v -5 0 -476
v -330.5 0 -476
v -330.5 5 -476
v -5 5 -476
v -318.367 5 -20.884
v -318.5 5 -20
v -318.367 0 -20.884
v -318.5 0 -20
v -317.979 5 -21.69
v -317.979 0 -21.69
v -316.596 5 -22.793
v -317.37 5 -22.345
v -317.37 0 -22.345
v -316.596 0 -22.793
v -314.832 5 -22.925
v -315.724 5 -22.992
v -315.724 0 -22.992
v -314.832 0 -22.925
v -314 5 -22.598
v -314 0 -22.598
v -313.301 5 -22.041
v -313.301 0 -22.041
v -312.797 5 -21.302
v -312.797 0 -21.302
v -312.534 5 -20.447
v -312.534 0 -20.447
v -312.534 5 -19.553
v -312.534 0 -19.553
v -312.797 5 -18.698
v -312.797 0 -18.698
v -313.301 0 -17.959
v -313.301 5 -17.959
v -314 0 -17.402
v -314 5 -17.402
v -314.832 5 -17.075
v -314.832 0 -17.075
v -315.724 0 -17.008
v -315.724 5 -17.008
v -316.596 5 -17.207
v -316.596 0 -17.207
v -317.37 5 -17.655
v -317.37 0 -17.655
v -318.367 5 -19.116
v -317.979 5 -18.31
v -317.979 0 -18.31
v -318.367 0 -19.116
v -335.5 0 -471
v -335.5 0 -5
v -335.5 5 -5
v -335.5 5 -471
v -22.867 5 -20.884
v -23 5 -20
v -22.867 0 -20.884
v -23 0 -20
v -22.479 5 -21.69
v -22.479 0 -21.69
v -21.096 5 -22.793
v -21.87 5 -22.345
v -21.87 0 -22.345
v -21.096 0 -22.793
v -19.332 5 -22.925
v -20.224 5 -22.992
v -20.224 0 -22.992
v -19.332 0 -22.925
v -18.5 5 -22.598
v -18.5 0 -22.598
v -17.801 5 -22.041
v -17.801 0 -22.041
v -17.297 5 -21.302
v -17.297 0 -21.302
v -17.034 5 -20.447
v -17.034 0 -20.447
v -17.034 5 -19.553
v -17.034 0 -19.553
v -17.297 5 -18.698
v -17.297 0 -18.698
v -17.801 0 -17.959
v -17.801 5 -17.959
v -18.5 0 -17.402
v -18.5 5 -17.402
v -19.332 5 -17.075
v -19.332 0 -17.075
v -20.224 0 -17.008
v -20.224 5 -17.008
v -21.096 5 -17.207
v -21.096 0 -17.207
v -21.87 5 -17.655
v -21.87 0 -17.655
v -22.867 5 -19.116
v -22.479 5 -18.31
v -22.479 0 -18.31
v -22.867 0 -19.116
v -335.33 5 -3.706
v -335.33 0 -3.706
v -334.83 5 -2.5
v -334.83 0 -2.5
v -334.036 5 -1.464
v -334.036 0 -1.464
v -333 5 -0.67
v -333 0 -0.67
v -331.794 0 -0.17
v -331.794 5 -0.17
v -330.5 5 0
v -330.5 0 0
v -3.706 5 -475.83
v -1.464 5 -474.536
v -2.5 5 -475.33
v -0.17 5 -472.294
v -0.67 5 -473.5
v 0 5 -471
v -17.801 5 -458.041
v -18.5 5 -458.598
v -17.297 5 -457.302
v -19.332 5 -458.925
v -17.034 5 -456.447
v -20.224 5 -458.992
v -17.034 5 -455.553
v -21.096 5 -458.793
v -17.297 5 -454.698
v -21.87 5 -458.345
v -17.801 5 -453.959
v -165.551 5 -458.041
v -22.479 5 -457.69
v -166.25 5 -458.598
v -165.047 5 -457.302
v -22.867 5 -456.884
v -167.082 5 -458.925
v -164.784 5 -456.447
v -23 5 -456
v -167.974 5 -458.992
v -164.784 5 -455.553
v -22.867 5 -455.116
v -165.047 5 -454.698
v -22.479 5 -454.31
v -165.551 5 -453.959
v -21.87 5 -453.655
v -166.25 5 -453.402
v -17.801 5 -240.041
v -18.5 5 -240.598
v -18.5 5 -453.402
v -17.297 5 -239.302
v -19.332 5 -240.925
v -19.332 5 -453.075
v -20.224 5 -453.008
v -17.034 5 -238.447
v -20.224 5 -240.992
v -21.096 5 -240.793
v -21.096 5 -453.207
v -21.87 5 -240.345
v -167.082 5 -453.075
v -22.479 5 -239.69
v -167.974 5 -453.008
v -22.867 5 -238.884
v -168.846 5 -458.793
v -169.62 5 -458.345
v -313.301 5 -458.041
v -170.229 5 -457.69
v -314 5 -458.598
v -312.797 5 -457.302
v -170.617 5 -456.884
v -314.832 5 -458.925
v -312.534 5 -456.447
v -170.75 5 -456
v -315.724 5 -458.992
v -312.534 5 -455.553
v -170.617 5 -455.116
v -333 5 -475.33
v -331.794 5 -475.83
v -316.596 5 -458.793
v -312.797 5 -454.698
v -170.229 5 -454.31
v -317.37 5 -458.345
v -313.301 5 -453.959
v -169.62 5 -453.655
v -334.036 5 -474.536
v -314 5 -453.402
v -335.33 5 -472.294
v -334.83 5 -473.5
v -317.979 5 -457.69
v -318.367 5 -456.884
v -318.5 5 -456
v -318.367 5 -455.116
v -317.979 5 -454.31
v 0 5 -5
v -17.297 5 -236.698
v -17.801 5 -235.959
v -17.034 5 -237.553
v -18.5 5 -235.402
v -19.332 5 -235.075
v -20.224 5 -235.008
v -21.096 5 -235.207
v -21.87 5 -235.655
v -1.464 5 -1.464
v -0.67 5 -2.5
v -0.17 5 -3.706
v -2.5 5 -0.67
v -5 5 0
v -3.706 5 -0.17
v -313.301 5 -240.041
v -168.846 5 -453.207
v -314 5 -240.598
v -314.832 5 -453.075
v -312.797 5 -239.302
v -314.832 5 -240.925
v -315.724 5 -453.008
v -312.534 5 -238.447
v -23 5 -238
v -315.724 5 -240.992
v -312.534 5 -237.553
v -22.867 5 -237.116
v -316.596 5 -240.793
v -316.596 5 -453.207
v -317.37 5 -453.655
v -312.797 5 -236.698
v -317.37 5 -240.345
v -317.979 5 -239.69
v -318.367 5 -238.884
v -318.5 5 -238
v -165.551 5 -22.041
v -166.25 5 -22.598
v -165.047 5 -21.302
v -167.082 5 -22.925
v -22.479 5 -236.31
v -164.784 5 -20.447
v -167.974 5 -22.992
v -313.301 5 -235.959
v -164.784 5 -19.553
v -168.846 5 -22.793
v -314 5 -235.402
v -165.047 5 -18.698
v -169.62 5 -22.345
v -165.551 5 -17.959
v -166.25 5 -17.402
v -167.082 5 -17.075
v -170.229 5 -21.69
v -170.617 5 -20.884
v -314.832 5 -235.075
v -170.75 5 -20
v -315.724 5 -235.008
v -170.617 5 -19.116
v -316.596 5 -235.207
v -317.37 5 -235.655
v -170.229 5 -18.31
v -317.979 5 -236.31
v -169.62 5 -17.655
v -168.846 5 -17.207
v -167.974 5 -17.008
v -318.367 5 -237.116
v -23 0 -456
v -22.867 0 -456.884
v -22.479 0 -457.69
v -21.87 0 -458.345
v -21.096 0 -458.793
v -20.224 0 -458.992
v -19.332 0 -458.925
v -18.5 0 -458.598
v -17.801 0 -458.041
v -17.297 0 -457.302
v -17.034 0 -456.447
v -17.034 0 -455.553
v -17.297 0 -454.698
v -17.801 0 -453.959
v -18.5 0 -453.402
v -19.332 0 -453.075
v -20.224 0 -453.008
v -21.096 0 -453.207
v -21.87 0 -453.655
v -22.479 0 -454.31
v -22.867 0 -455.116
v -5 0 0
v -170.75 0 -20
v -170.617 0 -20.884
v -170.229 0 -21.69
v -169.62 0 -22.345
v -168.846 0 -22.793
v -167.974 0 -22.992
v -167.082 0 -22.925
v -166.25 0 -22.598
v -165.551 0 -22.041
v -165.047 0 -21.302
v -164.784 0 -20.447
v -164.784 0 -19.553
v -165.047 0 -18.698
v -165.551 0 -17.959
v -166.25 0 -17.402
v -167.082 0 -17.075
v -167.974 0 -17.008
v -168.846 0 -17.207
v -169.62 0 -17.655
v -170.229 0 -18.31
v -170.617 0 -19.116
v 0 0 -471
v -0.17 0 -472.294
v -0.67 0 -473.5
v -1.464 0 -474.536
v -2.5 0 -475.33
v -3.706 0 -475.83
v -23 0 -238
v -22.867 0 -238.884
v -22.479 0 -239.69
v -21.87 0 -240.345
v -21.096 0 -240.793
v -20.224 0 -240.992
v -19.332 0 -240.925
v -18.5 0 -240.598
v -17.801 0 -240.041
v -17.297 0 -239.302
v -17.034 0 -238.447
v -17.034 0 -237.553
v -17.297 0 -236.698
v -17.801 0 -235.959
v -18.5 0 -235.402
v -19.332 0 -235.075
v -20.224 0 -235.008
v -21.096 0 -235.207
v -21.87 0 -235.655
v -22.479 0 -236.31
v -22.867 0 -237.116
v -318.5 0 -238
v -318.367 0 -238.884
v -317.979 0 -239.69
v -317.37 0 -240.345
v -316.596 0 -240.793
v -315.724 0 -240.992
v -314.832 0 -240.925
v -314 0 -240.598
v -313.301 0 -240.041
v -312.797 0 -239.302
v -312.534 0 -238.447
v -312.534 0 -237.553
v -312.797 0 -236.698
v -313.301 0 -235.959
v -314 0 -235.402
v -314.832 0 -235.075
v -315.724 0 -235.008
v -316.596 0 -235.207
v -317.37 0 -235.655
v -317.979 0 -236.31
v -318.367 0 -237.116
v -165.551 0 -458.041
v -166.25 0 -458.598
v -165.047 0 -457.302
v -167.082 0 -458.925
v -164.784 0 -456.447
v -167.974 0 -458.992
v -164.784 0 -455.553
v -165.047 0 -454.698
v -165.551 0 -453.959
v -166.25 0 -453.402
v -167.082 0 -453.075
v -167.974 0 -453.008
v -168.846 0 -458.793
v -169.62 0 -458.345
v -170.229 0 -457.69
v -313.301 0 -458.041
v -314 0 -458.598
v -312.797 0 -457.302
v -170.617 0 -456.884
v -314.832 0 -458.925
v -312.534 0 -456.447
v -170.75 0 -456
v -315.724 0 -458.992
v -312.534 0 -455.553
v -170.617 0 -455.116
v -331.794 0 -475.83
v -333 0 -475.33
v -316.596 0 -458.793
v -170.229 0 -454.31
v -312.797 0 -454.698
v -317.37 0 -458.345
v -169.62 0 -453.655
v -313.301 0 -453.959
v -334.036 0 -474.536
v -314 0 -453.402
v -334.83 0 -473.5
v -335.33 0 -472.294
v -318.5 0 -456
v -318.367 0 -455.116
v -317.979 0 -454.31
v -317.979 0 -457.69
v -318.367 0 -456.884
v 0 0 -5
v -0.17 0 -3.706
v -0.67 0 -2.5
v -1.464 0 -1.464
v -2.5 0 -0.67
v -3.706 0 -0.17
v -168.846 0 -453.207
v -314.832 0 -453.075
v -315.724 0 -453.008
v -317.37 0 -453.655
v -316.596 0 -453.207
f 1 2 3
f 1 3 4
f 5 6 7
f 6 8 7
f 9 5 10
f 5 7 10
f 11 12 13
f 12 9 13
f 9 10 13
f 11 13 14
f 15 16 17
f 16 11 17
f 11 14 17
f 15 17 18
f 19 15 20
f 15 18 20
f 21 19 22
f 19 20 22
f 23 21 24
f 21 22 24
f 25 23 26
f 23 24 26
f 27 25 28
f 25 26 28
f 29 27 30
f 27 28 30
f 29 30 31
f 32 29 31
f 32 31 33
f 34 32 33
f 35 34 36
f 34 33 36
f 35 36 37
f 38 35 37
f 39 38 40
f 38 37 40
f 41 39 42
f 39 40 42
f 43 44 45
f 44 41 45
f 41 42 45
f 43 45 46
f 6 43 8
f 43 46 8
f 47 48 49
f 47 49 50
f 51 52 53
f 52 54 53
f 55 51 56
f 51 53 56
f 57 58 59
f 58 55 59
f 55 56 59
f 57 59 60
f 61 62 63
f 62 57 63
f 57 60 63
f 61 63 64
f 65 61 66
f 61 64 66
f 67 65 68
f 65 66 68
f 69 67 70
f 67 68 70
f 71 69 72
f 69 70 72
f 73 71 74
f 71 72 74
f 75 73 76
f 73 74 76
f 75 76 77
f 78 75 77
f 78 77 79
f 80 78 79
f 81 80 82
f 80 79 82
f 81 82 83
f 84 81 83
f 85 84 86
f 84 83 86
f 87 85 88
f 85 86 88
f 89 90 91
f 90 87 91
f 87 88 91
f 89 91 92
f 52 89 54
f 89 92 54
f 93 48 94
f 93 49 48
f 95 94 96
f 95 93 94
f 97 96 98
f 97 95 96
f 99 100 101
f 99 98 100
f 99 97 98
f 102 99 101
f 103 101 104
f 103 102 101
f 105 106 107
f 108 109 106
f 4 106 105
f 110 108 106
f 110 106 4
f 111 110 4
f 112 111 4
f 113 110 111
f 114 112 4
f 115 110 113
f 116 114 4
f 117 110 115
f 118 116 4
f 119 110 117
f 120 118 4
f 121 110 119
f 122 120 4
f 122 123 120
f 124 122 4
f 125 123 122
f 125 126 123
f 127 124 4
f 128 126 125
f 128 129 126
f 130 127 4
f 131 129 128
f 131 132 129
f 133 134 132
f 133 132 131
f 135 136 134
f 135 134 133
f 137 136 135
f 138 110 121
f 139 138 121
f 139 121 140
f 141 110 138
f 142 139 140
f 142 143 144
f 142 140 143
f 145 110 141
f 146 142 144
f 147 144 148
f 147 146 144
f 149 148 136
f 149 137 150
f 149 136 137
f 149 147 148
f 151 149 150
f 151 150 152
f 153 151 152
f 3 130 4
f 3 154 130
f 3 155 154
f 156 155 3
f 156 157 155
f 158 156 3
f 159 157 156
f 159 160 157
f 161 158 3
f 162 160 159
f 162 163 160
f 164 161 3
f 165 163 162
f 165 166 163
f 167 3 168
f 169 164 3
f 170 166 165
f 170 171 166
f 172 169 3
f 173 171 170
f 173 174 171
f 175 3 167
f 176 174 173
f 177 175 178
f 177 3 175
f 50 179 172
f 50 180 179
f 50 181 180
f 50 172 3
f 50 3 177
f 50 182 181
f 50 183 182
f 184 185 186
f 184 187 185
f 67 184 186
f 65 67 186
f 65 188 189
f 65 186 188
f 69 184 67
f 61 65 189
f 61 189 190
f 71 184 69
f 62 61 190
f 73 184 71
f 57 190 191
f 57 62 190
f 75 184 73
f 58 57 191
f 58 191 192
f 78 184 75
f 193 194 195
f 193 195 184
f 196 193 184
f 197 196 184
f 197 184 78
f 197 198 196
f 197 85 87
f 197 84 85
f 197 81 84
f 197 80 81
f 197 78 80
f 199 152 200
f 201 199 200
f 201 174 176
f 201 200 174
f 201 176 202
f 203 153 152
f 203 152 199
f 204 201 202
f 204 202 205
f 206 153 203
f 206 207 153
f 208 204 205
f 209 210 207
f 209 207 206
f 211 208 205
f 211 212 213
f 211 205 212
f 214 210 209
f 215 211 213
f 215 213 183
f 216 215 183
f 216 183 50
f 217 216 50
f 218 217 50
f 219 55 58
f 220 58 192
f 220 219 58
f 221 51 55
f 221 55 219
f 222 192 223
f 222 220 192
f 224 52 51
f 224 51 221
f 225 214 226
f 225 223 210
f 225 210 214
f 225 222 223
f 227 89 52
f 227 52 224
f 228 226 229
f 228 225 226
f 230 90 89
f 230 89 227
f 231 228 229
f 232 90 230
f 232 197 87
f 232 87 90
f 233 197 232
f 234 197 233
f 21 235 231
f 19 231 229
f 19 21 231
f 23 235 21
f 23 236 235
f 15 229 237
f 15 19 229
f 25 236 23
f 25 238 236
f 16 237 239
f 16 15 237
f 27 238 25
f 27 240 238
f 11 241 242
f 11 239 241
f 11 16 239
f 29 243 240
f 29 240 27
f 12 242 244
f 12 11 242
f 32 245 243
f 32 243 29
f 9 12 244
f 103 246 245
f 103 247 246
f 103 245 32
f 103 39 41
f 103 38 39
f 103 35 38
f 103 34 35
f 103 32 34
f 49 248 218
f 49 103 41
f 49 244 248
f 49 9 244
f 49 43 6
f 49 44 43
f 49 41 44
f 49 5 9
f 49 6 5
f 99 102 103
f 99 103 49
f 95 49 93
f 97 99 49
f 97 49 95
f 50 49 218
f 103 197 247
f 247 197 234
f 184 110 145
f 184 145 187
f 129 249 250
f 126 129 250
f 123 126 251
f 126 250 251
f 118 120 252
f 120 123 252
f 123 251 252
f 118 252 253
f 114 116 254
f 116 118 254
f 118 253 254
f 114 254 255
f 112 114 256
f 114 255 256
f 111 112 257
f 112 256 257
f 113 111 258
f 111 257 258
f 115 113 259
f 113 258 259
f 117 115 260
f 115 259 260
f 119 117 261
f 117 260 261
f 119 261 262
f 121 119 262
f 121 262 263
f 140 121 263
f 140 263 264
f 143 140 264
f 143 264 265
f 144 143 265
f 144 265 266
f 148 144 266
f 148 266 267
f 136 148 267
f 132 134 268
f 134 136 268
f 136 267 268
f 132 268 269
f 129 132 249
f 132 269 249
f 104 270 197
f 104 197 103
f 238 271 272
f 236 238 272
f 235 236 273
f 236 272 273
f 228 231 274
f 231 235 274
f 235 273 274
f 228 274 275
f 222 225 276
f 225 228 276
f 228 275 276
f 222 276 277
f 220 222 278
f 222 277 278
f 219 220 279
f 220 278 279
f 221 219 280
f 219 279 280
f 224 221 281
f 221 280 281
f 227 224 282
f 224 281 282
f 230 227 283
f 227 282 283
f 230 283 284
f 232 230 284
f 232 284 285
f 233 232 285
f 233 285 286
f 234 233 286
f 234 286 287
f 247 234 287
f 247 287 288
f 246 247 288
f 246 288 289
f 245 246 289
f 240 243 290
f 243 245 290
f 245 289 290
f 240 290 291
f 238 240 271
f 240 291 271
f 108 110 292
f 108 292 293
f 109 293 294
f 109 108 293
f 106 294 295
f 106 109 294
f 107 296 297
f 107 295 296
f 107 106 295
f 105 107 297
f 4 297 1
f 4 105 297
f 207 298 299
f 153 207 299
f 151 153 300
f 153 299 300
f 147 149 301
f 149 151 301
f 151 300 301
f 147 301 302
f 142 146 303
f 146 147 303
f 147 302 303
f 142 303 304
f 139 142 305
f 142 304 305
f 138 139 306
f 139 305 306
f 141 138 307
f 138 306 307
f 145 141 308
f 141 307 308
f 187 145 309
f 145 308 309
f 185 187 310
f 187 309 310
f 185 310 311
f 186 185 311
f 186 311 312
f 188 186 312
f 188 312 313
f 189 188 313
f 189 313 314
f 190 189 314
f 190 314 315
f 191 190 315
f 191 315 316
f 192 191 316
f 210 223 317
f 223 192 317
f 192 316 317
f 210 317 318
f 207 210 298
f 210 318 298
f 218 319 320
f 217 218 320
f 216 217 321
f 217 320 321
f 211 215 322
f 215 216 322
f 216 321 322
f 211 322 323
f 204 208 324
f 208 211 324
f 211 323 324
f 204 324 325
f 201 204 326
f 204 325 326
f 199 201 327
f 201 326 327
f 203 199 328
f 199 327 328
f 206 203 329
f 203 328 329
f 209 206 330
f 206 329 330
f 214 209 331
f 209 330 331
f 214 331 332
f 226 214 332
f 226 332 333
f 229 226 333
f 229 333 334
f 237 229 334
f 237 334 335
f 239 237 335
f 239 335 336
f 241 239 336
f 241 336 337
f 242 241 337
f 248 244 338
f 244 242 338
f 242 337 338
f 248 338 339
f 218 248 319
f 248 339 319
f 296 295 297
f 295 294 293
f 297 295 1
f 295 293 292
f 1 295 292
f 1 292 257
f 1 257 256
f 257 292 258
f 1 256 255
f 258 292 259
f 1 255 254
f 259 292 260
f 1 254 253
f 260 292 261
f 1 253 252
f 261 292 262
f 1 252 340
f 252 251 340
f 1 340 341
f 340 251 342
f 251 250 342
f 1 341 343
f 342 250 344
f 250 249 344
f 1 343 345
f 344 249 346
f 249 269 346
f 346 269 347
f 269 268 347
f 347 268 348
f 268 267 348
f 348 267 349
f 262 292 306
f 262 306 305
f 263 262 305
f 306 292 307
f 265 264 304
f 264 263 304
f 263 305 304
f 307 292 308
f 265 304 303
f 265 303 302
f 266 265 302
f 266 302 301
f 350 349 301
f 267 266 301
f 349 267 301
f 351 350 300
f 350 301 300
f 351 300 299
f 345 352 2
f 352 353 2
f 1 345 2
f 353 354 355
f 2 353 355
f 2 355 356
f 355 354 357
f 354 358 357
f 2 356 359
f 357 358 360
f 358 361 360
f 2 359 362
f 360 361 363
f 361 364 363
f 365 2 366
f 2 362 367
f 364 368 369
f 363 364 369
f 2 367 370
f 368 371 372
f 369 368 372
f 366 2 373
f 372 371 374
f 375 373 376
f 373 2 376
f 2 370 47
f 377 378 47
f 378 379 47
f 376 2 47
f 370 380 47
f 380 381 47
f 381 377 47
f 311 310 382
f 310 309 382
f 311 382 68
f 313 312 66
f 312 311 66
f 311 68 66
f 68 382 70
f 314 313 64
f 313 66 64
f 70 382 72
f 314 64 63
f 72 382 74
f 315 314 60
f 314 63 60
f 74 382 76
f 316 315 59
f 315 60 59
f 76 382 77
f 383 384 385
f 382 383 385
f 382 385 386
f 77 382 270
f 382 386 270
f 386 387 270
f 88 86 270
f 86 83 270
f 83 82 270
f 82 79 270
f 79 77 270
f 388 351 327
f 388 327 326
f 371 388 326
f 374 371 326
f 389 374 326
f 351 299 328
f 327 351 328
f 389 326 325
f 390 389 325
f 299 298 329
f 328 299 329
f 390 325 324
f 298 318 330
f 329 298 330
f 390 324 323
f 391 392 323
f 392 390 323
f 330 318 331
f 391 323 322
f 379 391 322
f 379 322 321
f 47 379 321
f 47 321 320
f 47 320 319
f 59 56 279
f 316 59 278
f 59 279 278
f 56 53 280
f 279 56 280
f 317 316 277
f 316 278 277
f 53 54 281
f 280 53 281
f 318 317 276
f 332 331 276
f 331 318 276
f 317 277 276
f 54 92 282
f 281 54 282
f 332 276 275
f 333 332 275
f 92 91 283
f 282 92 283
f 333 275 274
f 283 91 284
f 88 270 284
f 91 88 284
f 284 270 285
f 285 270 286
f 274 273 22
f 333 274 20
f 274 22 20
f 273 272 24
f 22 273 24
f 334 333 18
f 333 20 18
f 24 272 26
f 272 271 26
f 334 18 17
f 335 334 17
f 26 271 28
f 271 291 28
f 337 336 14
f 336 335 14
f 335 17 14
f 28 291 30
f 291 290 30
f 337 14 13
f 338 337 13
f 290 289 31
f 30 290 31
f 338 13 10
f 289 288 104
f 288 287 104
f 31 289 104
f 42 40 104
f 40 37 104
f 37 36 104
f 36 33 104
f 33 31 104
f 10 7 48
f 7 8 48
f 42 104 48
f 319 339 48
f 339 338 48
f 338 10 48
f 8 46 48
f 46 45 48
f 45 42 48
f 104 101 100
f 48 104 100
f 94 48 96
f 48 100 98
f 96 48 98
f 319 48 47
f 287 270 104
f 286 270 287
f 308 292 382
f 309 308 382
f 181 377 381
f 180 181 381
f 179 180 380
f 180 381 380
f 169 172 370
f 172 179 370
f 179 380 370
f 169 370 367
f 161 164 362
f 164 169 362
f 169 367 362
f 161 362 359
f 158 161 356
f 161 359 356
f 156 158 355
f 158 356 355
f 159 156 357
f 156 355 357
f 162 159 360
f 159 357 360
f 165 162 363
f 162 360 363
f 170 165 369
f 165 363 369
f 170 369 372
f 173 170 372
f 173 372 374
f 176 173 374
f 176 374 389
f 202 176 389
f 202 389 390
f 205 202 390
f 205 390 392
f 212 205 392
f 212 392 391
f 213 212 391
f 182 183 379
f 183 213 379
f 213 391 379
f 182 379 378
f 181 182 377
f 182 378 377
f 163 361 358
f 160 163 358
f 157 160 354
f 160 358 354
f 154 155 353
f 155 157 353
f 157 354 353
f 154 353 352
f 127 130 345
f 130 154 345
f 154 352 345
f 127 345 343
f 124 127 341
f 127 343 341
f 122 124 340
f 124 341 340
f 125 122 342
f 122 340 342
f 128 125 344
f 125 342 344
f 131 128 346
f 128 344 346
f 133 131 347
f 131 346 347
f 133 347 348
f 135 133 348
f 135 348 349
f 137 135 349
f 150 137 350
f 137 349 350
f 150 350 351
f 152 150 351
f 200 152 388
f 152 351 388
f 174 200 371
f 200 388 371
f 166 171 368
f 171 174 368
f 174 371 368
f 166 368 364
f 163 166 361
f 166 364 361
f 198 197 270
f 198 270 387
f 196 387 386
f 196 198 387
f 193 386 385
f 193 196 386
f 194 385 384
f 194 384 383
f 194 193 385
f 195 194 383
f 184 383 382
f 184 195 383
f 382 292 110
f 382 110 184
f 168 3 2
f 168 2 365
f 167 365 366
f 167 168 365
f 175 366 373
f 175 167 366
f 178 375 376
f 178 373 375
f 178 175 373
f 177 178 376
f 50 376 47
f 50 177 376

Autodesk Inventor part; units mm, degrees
ref_plane "YZ Plane" through (0, 0, 0) normal (1, 0, 0) x (0, 1, 0)
ref_plane "XZ Plane" through (0, 0, 0) normal (0, 1, 0) x (-1, 0, 0)
ref_plane "XY Plane" through (0, 0, 0) normal (0, 0, 1) x (1, 0, 0)
sketch "Sketch1" plane through (0, 0, 0) normal (0, 1, 0) x (-1, 0, 0)
  line L0 (0, 0) -> (335.5, 0)
  line L1 (335.5, 0) -> (335.5, -476)
  line L2 (335.5, -476) -> (0, -476)
  line L3 (0, -476) -> (0, 0)
  circle A0 centre (315.5, -20) radius 3
  circle A1 centre (315.5, -456) radius 3
  circle A2 centre (20, -20) radius 3
  circle A3 centre (20, -456) radius 3
  circle A4 centre (167.75, -20) radius 3
  circle A5 centre (167.75, -456) radius 3
  circle A6 centre (315.5, -238) radius 3
  circle A7 centre (20, -238) radius 3
  point P0 (167.75, 0)
  point P1 (167.75, -476)
  point P2 (0, -238)
  point P3 (335.5, -238)
  dimension "d0" = 335.5
  dimension "d1" = 476
  dimension "d2" = 6
  dimension "d3" = 20
  dimension "d4" = 20
  dimension "d7" = 436
  dimension "d10" = 295.5
  dimension "d13" = 6
  dimension "d14" = 6
  dimension "d15" = 6
  dimension "d16" = 6
extrude "Extrusion1" add sketch "Sketch1" along normal blind 5
fillet "Fillet1" radius 5 4 edges at (0, 2.5, 0) (-335.5, 2.5, 0) (-335.5, 2.5, -476) (0, 2.5, -476)
equation "\"d14\" = d2"
properties part number "BED_PLATE_V2"
